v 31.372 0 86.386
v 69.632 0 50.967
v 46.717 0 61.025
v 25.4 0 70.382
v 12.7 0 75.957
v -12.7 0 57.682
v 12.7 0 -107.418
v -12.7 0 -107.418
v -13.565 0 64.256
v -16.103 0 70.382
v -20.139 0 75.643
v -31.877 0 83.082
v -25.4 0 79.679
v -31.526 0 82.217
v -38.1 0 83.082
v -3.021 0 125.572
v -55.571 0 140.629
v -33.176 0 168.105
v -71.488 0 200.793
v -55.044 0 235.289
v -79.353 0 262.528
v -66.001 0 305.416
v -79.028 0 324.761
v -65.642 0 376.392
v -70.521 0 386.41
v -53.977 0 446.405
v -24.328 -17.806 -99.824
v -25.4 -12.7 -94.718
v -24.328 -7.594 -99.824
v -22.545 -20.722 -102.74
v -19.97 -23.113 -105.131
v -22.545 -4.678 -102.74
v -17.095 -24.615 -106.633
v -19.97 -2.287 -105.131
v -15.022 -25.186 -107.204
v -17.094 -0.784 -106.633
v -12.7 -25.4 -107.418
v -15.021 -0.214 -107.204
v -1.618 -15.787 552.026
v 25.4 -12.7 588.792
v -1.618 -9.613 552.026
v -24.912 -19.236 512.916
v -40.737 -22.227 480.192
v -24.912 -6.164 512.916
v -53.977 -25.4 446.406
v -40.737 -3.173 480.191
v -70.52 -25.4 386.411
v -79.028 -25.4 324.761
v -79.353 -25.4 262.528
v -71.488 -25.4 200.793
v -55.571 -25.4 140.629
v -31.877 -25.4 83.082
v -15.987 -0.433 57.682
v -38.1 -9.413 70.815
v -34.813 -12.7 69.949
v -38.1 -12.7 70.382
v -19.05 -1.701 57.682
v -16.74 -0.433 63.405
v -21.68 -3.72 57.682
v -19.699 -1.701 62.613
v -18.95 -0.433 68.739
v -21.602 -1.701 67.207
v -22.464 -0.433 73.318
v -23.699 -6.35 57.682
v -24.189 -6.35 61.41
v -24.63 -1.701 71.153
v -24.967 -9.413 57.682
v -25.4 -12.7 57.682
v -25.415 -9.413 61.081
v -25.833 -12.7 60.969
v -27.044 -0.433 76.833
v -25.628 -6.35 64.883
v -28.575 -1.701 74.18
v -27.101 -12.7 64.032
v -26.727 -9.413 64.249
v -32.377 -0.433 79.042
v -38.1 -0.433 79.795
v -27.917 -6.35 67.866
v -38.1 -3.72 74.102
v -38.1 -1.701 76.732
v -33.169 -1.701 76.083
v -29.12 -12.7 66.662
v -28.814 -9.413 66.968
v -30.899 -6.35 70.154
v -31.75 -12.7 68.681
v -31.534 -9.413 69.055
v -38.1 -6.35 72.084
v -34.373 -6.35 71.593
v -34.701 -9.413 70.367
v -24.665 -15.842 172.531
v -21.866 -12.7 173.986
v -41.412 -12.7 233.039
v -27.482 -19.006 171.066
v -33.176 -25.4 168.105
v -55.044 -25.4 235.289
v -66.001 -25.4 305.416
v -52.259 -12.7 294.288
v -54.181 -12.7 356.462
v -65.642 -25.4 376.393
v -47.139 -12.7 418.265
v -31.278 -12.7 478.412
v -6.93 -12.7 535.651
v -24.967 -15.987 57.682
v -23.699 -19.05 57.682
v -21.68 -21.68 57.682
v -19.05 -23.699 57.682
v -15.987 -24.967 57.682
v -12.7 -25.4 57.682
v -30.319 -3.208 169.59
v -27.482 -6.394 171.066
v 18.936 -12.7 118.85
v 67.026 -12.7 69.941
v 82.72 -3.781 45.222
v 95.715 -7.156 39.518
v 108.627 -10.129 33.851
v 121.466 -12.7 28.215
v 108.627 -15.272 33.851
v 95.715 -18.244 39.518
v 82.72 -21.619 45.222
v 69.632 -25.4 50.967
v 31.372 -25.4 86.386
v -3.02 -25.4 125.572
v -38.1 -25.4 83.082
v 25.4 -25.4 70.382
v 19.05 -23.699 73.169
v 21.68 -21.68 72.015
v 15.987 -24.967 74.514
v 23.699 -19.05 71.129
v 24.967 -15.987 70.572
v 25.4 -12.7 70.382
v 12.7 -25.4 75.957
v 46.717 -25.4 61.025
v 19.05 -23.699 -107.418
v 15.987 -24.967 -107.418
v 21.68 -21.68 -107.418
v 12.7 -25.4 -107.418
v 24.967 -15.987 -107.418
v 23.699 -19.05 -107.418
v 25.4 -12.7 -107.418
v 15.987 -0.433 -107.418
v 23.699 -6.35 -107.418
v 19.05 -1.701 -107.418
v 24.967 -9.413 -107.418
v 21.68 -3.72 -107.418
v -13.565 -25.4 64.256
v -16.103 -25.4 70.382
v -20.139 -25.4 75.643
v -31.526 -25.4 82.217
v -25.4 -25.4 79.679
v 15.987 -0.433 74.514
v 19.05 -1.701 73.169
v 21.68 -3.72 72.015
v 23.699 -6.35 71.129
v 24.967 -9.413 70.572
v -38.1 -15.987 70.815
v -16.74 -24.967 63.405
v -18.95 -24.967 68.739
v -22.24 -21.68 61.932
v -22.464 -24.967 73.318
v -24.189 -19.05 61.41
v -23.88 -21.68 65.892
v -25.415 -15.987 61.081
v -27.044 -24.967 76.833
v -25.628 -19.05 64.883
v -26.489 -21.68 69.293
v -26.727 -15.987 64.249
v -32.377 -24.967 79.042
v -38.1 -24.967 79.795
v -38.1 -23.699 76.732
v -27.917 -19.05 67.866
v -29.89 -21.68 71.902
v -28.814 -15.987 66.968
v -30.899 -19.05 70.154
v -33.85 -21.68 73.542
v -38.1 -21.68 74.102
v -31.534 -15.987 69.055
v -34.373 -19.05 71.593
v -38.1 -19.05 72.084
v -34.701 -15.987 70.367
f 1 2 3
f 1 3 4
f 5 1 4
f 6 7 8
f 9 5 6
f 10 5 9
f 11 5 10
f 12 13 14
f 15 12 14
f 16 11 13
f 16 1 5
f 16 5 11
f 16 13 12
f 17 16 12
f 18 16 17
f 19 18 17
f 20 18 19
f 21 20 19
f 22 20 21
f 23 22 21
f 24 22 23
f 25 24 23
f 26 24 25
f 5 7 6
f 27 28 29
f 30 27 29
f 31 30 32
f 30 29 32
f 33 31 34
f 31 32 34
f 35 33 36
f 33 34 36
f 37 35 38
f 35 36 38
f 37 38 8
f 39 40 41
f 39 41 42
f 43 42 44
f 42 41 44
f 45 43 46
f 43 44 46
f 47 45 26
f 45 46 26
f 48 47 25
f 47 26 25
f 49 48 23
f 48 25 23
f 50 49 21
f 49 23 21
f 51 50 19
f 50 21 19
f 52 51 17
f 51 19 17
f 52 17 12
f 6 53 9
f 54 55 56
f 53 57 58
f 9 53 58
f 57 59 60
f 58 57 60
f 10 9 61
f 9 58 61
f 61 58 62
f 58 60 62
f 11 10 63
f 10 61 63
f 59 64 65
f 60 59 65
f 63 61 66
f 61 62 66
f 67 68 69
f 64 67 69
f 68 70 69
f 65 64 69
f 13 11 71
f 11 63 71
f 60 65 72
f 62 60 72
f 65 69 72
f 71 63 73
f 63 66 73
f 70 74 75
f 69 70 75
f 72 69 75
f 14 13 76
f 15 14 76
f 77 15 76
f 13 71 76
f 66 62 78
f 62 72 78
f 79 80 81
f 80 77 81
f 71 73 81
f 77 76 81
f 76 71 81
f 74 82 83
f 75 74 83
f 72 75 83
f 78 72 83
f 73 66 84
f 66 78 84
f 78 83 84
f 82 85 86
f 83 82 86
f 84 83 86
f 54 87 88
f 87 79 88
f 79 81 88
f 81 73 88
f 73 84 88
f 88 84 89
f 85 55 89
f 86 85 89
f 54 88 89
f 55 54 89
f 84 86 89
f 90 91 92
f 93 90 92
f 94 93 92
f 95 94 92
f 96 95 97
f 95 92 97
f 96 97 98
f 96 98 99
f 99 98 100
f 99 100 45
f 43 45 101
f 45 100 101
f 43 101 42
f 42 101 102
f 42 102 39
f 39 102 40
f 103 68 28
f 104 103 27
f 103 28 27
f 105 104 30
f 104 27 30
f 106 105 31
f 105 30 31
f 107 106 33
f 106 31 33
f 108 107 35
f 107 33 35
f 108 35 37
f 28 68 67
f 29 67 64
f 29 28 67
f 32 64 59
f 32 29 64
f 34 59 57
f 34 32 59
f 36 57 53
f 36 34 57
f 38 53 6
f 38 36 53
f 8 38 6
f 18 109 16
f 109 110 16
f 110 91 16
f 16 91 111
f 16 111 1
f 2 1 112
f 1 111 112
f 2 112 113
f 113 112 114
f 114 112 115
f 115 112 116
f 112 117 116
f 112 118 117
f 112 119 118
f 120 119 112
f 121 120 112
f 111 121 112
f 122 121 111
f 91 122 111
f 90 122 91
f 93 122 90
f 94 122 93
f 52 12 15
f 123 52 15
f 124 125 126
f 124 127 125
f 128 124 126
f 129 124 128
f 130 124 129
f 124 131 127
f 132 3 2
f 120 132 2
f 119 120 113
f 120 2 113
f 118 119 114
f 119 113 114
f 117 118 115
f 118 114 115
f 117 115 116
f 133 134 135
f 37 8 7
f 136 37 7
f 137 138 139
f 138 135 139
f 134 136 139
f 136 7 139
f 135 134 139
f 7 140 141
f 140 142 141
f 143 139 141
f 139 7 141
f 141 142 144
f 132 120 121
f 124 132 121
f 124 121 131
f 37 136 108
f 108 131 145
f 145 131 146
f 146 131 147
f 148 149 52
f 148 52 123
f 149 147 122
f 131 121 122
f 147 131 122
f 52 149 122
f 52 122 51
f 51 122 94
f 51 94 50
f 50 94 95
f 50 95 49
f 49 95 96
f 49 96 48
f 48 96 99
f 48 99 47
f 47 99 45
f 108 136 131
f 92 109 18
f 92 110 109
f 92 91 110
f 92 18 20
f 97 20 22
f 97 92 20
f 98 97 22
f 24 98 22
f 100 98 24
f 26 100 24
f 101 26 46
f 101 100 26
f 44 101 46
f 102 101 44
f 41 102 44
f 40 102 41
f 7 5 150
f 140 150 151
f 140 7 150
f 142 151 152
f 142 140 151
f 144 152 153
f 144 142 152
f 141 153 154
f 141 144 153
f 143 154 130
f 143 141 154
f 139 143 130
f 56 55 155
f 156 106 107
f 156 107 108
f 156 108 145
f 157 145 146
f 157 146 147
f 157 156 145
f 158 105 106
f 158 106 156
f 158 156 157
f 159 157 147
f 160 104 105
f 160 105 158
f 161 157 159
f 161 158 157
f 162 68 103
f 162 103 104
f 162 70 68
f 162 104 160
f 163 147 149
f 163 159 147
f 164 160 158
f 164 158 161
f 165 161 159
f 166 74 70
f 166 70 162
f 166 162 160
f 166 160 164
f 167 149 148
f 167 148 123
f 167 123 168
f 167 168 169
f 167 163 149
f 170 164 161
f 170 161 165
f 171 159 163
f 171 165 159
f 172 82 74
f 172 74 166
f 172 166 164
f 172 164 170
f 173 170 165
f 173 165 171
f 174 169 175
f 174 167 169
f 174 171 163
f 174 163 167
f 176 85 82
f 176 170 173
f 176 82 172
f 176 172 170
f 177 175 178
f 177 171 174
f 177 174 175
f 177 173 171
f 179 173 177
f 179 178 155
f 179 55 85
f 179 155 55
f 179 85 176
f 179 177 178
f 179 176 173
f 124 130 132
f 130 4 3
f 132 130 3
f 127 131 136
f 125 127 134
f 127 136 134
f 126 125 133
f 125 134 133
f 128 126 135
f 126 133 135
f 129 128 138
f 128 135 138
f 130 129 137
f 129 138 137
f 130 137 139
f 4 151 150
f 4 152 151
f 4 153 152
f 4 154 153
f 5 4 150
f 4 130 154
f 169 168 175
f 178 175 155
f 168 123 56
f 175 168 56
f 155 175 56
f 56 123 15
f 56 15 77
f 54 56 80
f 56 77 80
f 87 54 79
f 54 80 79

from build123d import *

# Parameters (mm, degrees)
F1_DEPTH     = 25.4
F2_T1_DEPTH  = 25.4
F2_T3_DEPTH  = 196.85
F2_T5_DEPTH  = 88.9
F2_T10_DEPTH = 241.3
F2_T15_DEPTH = 241.3
F2_T18_ANGLE = 233.2969892374
F2_T20_ANGLE = 233.2969892374
F3_C1_SIZE   = 12.7
F3_C2_SIZE   = 12.7
F3_C3_SIZE   = 12.6999
F3_C4_SIZE   = 12.6999


# Not quite as in the source:
# - a fillet or chamfer that OpenCascade refuses, or shapes differently, is made with other operations: its cross-section is extruded or revolved along the edge and cut away or added
# - a fillet or chamfer is up to 0.001 mm smaller than in the source, because OpenCascade refuses the exact size


with BuildPart() as f1:
    # F0 (on Front) → F1 (new body)
    with BuildSketch(Plane.XZ):
        Polygon((-25.4, -107.4178270914), (0, -107.4178270914), (25.4, -107.4178270914), (25.4, 70.3821729086), (-25.4, 70.3821729086), align=None)
        with BuildLine():
            ThreePointArc((-31.8772674395, 83.0821729086), (-28.6865783939, 76.7077201152), (-25.4, 70.3821729086))
            Line((-25.4, 70.3821729086), (25.4, 70.3821729086))
            Line((25.4, 70.3821729086), (46.7168006713, 61.0254222331))
            ThreePointArc((46.7168006713, 61.0254222331), (8.0726901659, 114.8632107301), (-21.8660467054, 173.9863600165))
            ThreePointArc((-21.8660467054, 173.9863600165), (-51.7756284743, 387.4903570682), (25.4, 588.7922751123))
            ThreePointArc((25.4, 588.7922751123), (-77.2246025315, 344.3169540256), (-31.8772674395, 83.0821729086))
        make_face()
        with BuildLine():
            Line((-38.1, 70.3821729086), (-25.4, 70.3821729086))
            ThreePointArc((-25.4, 70.3821729086), (-28.6865783939, 76.7077201152), (-31.8772674395, 83.0821729086))
            Line((-31.8772674395, 83.0821729086), (-38.1, 83.0821729086))
            Line((-38.1, 83.0821729086), (-38.1, 70.3821729086))
        make_face()
        with BuildLine():
            ThreePointArc((-21.8660467054, 173.9863600165), (8.0726901659, 114.8632107301), (46.7168006713, 61.0254222331))
            Line((46.7168006713, 61.0254222331), (121.4661896229, 28.2150860876))
            ThreePointArc((121.4661896229, 28.2150860876), (42.125694257, 93.5547531424), (-21.8660467054, 173.9863600165))
        make_face()
    extrude(amount=F1_DEPTH)

    # F2: fillet of radius 12.7 on 6 edges, made by hand

    # F2_s2 → F2_t1 (join)
    with BuildSketch(Plane.XZ):
        with BuildLine():
            ThreePointArc((-25.4, 57.6821729086), (-29.1197438789, 66.6624290297), (-38.1, 70.3821729086))
            Line((-38.1, 70.3821729086), (-25.4, 70.3821729086))
            Line((-25.4, 70.3821729086), (-25.4, 57.6821729086))
        make_face()
    extrude(amount=F2_T1_DEPTH)

    # F2_s4 → F2_t3 (cut)
    with BuildSketch(Plane.XY.offset(-139.1678270914)):
        with BuildLine():
            ThreePointArc((-25.4, -12.7), (-21.6802561211, -3.7197438789), (-12.7, 0))
            Line((-12.7, 0), (-25.4, 0))
            Line((-25.4, 0), (-25.4, -12.7))
        make_face()
        with BuildLine():
            ThreePointArc((-25.4, -12.7), (-21.6802561211, -21.6802561211), (-12.7, -25.4))
            Line((-12.7, -25.4), (-25.4, -25.4))
            Line((-25.4, -25.4), (-25.4, -12.7))
        make_face()
    extrude(amount=F2_T3_DEPTH, mode=Mode.SUBTRACT)

    # F2_s6 → F2_t5 (cut)
    with BuildSketch(Plane.XZ.offset(-31.75)):
        with BuildLine():
            ThreePointArc((-25.4, -94.7178270914), (-21.6802561211, -103.6980832124), (-12.7, -107.4178270914))
            Line((-12.7, -107.4178270914), (-25.4, -107.4178270914))
            Line((-25.4, -107.4178270914), (-25.4, -94.7178270914))
        make_face()
    extrude(amount=F2_T5_DEPTH, mode=Mode.SUBTRACT)


with BuildPart() as f2_tool8:
    # F2_s9 → F2_t10 (new body)
    with BuildSketch(Plane.XY.offset(-139.1678270914)):
        with BuildLine():
            ThreePointArc((12.7, 0), (21.6802561211, -3.7197438789), (25.4, -12.7))
            Line((25.4, -12.7), (25.4, 0))
            Line((25.4, 0), (12.7, 0))
        make_face()
    extrude(amount=F2_T10_DEPTH)

    split(bisect_by=Plane(origin=(30.005981648, 0, 68.3604332226), x_dir=(0, 1, 0), z_dir=(-0.4019236244, 0, -0.9156731951)), keep=Keep.TOP)


with BuildPart() as f1_1:
    add(f1.part)

    # F2_t7: cut F2_tool8
    add(f2_tool8.part, mode=Mode.SUBTRACT)


with BuildPart() as f2_tool13:
    # F2_s14 → F2_t15 (new body)
    with BuildSketch(Plane.XY.offset(-139.1678270914)):
        with BuildLine():
            ThreePointArc((12.7, -25.4), (21.6802561211, -21.6802561211), (25.4, -12.7))
            Line((25.4, -12.7), (25.4, -25.4))
            Line((25.4, -25.4), (12.7, -25.4))
        make_face()
    extrude(amount=F2_T15_DEPTH)

    split(bisect_by=Plane(origin=(30.005981648, 0, 68.3604332226), x_dir=(0, 1, 0), z_dir=(-0.4019236244, 0, -0.9156731951)), keep=Keep.TOP)


with BuildPart() as f1_2:
    add(f1_1.part)

    # F2_t12: cut F2_tool13
    add(f2_tool13.part, mode=Mode.SUBTRACT)

    # F2_s17 → F2_t18 (revolve, cut)
    with BuildSketch(Plane.XY.offset(57.6821729086)):
        with BuildLine():
            ThreePointArc((-12.7, -25.4), (-21.6802561211, -21.6802561211), (-25.4, -12.7))
            Line((-25.4, -12.7), (-25.4, -25.4))
            Line((-25.4, -25.4), (-12.7, -25.4))
        make_face()
    revolve(axis=Axis((-38.1, -25.4, 57.6821729086), (0, -1, 0)), revolution_arc=F2_T18_ANGLE, mode=Mode.SUBTRACT)

    # F2_s19 → F2_t20 (revolve, cut)
    with BuildSketch(Plane.XY.offset(57.6821729086)):
        with BuildLine():
            ThreePointArc((-12.7, 0), (-21.6802561211, -3.7197438789), (-25.4, -12.7))
            Line((-25.4, -12.7), (-25.4, 0))
            Line((-25.4, 0), (-12.7, 0))
        make_face()
    revolve(axis=Axis((-38.1, 0, 57.6821729086), (0, -1, 0)), revolution_arc=F2_T20_ANGLE, mode=Mode.SUBTRACT)

    # F3: chamfer of 12.7 on 4 edges, made by hand

    # F3_c1
    f3_c1_edges = [f1_2.edges().sort_by_distance(p)[0] for p in [
        (-51.7756284743, 0, 387.4903570682),
    ]]
    chamfer(f3_c1_edges, length=F3_C1_SIZE)

    # F3_c2
    f3_c2_edges = [f1_2.edges().sort_by_distance(p)[0] for p in [
        (42.125694257, 0, 93.5547531424),
    ]]
    chamfer(f3_c2_edges, length=F3_C2_SIZE)

    # F3_c3 (size 12.7 in the source; OpenCascade refuses exactly that, so slightly less here)
    f3_c3_edges = [f1_2.edges().sort_by_distance(p)[0] for p in [
        (-51.7756284743, -25.4, 387.4903570682),
    ]]
    chamfer(f3_c3_edges, length=F3_C3_SIZE)

    # F3_c4 (size 12.7 in the source; OpenCascade refuses exactly that, so slightly less here)
    f3_c4_edges = [f1_2.edges().sort_by_distance(p)[0] for p in [
        (42.125694257, -25.4, 93.5547531424),
    ]]
    chamfer(f3_c4_edges, length=F3_C4_SIZE)


solid = f1_2.part
